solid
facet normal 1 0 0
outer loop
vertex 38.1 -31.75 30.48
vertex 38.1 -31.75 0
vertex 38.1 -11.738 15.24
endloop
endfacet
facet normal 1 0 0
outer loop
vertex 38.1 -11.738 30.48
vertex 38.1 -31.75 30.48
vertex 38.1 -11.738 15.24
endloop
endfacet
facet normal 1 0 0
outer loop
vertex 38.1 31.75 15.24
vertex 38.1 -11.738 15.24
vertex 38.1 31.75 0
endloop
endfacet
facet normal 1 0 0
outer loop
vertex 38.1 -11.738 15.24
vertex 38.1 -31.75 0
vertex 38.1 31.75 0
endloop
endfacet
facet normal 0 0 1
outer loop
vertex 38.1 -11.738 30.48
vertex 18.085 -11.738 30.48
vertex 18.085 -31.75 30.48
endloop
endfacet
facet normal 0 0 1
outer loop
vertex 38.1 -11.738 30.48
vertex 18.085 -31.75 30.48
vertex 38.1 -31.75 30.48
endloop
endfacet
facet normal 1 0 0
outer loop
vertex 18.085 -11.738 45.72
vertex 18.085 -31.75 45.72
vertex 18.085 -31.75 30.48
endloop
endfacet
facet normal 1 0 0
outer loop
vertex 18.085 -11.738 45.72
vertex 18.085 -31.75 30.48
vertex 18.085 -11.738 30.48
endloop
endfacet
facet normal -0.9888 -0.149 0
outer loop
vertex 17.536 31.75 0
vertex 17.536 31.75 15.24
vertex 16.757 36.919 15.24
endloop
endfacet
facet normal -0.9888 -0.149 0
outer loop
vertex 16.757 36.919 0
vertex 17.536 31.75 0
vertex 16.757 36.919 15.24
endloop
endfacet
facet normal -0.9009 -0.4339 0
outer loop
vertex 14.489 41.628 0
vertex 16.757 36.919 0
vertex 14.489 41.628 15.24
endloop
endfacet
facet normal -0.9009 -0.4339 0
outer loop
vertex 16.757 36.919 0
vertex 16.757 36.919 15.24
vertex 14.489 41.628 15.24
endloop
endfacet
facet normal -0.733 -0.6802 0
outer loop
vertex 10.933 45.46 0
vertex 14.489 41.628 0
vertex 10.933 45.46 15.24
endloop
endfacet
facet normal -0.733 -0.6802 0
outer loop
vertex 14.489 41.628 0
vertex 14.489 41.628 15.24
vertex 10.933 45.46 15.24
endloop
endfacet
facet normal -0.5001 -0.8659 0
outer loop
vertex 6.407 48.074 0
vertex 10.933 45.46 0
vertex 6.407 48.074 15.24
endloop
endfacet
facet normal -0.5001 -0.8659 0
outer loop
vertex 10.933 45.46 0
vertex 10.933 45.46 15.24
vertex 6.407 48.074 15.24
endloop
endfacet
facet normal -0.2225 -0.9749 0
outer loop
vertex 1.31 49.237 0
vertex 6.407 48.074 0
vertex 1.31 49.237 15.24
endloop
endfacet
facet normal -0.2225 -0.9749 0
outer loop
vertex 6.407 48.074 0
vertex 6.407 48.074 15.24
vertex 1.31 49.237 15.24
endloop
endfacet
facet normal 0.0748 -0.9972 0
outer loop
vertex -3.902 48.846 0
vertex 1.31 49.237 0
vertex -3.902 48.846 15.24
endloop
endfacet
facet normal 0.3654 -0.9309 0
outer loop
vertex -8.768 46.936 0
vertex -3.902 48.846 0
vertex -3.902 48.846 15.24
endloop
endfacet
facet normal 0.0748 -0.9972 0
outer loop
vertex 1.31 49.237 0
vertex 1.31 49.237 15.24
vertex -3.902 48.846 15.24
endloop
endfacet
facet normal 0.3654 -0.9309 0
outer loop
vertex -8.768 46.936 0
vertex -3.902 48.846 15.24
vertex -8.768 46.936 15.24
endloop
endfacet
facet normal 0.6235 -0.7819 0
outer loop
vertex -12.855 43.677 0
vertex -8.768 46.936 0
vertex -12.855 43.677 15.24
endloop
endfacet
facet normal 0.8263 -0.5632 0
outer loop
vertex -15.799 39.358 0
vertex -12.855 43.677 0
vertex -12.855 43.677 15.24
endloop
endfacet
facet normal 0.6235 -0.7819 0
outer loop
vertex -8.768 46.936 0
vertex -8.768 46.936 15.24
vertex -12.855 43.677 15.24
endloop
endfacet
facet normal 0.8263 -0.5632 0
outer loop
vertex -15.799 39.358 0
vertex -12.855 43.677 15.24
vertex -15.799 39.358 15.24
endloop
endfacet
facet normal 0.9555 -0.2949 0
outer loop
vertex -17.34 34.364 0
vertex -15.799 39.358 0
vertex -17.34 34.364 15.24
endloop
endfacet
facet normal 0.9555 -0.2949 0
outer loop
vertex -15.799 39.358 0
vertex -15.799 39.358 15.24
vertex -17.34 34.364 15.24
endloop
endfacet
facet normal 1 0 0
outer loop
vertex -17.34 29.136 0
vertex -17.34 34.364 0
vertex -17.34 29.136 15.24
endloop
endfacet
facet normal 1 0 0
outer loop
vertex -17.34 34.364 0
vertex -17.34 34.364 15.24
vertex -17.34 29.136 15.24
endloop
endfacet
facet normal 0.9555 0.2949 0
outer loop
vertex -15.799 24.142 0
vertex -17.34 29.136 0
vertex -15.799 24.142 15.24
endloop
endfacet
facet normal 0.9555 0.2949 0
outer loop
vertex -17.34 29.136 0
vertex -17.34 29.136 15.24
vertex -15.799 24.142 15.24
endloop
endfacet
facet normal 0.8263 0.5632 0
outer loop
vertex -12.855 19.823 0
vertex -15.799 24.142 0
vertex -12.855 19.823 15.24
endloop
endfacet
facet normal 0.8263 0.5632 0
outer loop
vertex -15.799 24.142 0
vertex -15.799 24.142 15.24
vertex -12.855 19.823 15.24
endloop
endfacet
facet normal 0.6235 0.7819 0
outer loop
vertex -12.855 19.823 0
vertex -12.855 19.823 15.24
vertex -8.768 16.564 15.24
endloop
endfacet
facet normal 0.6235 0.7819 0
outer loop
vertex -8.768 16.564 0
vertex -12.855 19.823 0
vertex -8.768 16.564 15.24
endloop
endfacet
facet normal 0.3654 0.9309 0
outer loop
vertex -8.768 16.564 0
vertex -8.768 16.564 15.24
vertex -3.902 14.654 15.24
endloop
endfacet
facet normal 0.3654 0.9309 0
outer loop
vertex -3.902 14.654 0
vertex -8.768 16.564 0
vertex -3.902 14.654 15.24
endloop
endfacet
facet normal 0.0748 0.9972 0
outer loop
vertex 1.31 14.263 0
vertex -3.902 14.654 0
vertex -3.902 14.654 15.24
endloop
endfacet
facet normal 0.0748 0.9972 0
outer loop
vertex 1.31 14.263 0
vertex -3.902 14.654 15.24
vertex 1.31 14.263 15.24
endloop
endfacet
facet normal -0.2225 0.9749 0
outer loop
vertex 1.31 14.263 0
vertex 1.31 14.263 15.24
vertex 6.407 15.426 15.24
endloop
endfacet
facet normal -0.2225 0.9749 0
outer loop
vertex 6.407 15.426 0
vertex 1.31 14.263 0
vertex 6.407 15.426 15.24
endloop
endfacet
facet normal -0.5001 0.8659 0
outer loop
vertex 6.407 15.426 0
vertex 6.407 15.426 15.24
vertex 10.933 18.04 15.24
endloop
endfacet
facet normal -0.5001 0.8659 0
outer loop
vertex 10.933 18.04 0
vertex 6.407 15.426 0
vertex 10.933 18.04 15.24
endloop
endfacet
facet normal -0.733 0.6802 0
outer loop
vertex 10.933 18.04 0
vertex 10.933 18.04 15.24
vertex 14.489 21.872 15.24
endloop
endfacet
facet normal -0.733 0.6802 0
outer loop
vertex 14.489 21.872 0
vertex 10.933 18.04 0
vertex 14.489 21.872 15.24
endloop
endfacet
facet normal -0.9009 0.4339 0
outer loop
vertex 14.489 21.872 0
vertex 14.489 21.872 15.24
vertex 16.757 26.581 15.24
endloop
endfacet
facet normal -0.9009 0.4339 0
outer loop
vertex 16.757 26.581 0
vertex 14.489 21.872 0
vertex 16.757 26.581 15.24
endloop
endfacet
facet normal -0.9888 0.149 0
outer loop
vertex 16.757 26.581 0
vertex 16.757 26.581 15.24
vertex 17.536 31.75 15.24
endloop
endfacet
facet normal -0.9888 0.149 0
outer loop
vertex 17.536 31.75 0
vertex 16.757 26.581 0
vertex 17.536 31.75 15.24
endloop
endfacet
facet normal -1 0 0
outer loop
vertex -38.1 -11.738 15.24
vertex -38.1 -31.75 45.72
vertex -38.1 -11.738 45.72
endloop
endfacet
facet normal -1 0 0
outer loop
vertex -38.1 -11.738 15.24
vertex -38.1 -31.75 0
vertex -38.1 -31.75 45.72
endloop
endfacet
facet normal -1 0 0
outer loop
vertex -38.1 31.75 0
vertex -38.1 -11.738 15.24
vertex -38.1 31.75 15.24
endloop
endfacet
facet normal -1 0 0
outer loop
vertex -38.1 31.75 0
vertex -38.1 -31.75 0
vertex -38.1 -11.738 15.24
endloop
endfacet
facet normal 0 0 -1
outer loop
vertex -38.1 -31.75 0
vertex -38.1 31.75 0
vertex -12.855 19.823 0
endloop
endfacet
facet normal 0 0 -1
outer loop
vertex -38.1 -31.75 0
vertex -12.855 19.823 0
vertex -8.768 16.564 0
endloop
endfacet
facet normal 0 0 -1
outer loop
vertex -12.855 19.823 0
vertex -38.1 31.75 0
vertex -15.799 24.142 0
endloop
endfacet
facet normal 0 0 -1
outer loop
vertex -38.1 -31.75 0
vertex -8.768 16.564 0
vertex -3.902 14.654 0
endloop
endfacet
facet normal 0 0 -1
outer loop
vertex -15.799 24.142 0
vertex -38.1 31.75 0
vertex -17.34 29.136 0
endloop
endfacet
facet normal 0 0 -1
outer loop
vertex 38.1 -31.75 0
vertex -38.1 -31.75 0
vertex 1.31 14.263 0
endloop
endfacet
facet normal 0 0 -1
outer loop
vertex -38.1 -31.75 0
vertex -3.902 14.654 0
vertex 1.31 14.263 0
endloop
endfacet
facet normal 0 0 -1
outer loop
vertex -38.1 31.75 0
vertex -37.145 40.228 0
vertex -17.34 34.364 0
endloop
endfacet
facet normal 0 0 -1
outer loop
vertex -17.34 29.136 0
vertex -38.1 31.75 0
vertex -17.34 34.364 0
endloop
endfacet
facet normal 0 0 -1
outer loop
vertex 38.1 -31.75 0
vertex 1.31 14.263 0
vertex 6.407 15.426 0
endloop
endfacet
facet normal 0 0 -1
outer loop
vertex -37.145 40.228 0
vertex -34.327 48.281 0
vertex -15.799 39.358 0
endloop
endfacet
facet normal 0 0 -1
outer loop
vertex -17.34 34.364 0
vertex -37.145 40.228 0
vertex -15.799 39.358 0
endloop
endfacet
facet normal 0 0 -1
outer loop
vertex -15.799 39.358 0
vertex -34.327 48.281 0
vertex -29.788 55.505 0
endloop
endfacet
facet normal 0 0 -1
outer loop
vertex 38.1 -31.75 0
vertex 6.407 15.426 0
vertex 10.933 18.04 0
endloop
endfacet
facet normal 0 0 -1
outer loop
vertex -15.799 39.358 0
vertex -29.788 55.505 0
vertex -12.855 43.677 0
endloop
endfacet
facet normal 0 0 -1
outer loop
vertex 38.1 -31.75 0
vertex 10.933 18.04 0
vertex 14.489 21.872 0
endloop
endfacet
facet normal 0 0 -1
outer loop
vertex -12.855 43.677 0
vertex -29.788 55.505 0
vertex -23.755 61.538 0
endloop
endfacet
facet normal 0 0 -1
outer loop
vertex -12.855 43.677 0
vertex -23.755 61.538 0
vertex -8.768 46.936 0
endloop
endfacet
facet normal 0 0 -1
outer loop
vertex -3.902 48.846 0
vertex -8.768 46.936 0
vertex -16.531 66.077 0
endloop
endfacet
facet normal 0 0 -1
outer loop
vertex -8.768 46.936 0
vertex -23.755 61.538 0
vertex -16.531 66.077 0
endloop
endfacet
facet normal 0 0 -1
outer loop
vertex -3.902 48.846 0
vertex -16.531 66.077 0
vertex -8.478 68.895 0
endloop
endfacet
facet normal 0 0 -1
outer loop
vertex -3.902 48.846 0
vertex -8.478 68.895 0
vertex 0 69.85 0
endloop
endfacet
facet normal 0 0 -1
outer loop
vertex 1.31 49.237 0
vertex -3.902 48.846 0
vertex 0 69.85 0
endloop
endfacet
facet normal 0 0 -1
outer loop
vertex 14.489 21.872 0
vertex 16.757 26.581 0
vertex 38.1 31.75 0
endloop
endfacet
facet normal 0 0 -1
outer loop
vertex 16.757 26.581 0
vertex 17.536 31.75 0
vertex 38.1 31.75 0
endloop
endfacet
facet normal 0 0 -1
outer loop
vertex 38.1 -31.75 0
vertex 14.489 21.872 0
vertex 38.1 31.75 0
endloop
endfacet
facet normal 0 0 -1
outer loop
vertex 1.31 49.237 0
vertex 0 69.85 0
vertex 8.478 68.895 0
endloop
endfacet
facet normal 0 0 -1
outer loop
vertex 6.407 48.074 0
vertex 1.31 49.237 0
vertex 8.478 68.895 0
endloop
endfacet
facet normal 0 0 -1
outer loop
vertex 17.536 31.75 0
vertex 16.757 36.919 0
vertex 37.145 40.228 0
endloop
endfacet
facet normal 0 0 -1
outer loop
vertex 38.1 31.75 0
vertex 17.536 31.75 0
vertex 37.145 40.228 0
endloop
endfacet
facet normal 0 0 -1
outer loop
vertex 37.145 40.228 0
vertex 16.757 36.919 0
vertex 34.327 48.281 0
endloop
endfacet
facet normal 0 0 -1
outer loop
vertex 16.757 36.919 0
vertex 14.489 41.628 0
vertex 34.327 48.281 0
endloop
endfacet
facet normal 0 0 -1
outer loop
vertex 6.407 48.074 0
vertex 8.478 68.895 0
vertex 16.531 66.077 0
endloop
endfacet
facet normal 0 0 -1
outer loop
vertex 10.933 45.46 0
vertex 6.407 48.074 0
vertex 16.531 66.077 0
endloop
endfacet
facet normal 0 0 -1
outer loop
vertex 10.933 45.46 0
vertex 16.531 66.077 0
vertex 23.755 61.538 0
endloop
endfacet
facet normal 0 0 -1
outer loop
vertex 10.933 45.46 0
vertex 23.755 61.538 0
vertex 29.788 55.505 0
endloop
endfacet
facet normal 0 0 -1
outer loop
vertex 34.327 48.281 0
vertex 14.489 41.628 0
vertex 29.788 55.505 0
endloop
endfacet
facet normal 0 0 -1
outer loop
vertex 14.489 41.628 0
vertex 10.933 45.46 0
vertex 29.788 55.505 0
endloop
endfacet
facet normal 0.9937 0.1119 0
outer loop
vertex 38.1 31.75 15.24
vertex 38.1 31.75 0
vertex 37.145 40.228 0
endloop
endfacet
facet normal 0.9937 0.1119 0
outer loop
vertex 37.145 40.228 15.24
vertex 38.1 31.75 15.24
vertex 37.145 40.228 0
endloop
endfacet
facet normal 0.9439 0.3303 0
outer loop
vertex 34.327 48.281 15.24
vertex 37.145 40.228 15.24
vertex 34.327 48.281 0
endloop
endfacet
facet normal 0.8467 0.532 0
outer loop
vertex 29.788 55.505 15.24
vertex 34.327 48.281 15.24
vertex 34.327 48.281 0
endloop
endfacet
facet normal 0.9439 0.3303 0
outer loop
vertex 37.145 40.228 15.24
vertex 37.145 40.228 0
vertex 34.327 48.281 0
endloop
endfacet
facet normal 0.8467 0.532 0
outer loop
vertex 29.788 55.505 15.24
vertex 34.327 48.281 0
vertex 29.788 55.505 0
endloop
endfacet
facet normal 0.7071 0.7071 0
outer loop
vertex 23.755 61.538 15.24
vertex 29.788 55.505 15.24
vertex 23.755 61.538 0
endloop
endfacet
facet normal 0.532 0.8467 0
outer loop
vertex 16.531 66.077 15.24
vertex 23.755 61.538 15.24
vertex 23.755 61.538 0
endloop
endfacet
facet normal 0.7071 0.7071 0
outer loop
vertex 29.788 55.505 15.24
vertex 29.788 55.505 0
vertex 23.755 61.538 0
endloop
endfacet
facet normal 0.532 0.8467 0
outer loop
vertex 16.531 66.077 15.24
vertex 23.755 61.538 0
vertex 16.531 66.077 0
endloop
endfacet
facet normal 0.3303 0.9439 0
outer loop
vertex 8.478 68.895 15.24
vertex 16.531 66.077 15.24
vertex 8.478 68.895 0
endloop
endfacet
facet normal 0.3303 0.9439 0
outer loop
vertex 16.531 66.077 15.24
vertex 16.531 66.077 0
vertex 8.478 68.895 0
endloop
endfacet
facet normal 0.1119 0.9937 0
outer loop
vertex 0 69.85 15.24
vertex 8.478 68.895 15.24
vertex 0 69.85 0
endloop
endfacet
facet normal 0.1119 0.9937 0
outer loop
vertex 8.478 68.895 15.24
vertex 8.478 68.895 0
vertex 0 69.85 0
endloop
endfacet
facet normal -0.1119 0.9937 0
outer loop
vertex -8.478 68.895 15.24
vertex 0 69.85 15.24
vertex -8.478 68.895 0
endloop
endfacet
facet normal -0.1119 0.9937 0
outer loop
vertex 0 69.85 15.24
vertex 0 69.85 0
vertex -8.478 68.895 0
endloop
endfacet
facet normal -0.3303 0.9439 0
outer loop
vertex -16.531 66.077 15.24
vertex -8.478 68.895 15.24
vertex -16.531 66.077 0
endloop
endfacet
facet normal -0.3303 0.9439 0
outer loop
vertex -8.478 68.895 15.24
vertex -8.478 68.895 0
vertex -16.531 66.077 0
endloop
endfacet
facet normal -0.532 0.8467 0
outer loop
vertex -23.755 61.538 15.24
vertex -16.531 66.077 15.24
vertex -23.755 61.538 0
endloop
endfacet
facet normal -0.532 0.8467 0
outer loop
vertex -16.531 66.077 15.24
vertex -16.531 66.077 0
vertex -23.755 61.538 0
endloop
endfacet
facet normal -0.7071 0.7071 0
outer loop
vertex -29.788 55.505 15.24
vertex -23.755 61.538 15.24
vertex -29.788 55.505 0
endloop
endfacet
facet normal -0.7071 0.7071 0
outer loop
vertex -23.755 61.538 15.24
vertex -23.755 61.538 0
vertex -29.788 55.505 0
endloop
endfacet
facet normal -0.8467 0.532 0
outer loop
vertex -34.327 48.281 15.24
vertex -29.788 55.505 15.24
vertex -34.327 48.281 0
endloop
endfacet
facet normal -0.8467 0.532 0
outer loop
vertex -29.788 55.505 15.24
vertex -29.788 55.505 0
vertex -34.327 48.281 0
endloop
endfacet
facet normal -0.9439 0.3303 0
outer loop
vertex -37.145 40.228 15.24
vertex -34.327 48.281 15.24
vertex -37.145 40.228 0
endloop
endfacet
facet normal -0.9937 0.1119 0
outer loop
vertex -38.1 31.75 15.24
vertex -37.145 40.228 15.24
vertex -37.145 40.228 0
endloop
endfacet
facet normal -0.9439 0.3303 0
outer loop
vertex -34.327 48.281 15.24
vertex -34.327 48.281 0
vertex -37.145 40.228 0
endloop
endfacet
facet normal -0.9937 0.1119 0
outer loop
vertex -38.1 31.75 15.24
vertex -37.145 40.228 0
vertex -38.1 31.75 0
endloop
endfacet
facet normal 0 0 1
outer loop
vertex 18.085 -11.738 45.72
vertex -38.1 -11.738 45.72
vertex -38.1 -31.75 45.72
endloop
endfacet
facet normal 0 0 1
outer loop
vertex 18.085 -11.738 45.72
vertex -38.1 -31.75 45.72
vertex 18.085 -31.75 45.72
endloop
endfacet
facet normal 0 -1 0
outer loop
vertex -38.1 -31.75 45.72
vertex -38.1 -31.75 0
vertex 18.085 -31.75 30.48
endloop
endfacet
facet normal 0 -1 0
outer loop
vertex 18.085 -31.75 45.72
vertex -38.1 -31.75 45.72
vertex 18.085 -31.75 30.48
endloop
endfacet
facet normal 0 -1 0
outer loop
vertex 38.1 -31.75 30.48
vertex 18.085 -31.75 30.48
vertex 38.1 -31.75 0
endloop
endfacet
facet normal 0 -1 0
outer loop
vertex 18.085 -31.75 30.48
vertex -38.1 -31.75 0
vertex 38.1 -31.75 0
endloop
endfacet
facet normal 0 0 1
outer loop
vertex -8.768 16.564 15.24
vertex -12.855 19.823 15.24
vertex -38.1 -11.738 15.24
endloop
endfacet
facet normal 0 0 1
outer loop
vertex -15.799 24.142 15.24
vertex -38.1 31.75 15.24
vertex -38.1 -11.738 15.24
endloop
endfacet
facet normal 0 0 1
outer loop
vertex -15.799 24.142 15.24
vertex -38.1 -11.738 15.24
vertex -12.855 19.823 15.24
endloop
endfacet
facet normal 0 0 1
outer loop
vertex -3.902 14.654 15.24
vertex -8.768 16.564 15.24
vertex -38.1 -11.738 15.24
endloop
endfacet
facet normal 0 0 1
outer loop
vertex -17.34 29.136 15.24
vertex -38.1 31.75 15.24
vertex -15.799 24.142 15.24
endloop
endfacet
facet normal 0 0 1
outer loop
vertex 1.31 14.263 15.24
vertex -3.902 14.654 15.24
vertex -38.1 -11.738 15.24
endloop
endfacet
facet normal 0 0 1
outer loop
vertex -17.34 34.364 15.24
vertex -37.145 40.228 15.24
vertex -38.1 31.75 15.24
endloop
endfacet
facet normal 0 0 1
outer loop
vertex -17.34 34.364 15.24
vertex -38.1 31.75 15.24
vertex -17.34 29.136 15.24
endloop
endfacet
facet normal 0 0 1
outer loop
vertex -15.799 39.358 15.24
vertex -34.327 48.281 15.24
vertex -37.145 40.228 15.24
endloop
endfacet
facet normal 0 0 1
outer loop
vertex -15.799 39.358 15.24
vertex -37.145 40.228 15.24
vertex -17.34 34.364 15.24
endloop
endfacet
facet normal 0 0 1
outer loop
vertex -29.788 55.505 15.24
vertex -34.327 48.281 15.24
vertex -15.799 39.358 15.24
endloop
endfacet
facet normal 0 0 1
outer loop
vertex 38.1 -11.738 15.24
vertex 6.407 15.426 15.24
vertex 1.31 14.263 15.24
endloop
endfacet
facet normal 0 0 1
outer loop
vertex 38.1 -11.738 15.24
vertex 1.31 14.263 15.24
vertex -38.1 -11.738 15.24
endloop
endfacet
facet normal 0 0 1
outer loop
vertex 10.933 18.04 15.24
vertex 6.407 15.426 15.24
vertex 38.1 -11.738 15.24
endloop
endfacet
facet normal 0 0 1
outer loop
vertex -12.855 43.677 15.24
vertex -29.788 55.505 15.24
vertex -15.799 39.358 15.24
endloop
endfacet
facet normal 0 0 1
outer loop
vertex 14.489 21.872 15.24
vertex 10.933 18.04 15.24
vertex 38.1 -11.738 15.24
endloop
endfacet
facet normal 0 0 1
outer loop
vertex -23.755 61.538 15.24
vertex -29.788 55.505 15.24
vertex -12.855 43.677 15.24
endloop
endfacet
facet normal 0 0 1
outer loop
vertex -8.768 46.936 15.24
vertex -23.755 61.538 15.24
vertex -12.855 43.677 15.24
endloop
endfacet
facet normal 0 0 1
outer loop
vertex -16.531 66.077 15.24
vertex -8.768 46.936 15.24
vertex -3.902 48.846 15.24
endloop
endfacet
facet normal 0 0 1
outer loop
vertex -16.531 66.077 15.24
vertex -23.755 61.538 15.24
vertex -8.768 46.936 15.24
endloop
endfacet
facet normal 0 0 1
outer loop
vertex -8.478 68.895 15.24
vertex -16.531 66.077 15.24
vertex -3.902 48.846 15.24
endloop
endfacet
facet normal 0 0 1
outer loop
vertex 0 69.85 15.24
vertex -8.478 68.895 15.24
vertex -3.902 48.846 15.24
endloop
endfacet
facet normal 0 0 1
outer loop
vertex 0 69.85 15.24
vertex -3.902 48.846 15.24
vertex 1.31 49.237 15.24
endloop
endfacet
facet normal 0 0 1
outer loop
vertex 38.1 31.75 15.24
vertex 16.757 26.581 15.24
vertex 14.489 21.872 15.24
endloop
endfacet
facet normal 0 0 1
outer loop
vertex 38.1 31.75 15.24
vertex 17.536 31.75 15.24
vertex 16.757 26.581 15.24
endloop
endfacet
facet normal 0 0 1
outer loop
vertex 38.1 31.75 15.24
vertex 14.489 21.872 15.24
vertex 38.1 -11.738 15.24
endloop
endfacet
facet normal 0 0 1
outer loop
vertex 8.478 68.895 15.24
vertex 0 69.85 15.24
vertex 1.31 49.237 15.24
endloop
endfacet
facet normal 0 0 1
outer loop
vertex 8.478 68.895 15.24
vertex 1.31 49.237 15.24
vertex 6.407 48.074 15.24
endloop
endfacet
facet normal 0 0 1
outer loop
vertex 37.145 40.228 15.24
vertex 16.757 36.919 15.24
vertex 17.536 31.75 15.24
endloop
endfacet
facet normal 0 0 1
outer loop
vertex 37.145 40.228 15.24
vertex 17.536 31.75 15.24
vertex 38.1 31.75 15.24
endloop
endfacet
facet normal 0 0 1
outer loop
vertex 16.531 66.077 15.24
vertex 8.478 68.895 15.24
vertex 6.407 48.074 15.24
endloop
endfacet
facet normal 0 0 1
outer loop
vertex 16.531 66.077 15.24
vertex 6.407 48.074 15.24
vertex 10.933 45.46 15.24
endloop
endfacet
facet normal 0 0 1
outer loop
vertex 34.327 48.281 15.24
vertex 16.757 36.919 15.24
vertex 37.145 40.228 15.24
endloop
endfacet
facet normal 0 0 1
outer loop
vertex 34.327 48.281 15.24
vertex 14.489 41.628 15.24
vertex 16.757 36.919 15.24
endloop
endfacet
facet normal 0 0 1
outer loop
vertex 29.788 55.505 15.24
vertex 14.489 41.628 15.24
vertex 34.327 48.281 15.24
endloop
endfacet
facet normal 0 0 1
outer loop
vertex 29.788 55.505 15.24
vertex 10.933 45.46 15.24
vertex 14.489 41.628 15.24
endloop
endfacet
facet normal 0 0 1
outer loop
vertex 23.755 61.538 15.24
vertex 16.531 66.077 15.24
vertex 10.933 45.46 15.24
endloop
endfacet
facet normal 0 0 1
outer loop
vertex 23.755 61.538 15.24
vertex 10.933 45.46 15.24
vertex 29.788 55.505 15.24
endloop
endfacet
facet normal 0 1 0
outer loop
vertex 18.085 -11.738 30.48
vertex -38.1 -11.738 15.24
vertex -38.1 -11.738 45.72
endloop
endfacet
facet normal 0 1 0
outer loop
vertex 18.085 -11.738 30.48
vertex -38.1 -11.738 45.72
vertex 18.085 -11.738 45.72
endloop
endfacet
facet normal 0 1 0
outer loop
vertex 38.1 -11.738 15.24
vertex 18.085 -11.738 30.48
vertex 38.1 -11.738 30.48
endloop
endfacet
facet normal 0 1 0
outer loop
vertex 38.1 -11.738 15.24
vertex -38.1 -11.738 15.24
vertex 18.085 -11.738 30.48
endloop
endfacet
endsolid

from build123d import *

# Parameters (mm, degrees)
F0_W     = 76.2
F0_H     = 63.5
F1_DEPTH = 15.24
F2_R     = 17.535676
F3_DEPTH = 15.241
F4_W     = 76.2
F4_H     = 20.012378
F5_DEPTH = 30.48
F6_W     = 20.0152
F6_H     = 20.012378
F7_DEPTH = 15.24


with BuildPart() as f1:
    # F0 (on Top) → F1 (new body)
    with BuildSketch(Plane.XY):
        with BuildLine():
            Line((-38.1, 31.75), (38.1, 31.75))
            ThreePointArc((38.1, 31.75), (0, 69.85), (-38.1, 31.75))
        make_face()
        Rectangle(F0_W, F0_H)
    extrude(amount=F1_DEPTH)

    # F2 (on face) → F3 (cut, through all)
    with BuildSketch(Plane.XY.offset(15.24)):
        with Locations((0, 31.75)):
            Circle(F2_R)
    extrude(amount=-F3_DEPTH, mode=Mode.SUBTRACT)

    # F4 (on face) → F5 (join)
    with BuildSketch(Plane.XY.offset(15.24)):
        with Locations((0, -21.743811)):
            Rectangle(F4_W, F4_H)
    extrude(amount=F5_DEPTH)

    # F6 (on face) → F7 (cut)
    with BuildSketch(Plane.XY.offset(45.72)):
        with Locations((28.0924, -21.743811)):
            Rectangle(F6_W, F6_H)
    extrude(amount=-F7_DEPTH, mode=Mode.SUBTRACT)


solid = f1.part
